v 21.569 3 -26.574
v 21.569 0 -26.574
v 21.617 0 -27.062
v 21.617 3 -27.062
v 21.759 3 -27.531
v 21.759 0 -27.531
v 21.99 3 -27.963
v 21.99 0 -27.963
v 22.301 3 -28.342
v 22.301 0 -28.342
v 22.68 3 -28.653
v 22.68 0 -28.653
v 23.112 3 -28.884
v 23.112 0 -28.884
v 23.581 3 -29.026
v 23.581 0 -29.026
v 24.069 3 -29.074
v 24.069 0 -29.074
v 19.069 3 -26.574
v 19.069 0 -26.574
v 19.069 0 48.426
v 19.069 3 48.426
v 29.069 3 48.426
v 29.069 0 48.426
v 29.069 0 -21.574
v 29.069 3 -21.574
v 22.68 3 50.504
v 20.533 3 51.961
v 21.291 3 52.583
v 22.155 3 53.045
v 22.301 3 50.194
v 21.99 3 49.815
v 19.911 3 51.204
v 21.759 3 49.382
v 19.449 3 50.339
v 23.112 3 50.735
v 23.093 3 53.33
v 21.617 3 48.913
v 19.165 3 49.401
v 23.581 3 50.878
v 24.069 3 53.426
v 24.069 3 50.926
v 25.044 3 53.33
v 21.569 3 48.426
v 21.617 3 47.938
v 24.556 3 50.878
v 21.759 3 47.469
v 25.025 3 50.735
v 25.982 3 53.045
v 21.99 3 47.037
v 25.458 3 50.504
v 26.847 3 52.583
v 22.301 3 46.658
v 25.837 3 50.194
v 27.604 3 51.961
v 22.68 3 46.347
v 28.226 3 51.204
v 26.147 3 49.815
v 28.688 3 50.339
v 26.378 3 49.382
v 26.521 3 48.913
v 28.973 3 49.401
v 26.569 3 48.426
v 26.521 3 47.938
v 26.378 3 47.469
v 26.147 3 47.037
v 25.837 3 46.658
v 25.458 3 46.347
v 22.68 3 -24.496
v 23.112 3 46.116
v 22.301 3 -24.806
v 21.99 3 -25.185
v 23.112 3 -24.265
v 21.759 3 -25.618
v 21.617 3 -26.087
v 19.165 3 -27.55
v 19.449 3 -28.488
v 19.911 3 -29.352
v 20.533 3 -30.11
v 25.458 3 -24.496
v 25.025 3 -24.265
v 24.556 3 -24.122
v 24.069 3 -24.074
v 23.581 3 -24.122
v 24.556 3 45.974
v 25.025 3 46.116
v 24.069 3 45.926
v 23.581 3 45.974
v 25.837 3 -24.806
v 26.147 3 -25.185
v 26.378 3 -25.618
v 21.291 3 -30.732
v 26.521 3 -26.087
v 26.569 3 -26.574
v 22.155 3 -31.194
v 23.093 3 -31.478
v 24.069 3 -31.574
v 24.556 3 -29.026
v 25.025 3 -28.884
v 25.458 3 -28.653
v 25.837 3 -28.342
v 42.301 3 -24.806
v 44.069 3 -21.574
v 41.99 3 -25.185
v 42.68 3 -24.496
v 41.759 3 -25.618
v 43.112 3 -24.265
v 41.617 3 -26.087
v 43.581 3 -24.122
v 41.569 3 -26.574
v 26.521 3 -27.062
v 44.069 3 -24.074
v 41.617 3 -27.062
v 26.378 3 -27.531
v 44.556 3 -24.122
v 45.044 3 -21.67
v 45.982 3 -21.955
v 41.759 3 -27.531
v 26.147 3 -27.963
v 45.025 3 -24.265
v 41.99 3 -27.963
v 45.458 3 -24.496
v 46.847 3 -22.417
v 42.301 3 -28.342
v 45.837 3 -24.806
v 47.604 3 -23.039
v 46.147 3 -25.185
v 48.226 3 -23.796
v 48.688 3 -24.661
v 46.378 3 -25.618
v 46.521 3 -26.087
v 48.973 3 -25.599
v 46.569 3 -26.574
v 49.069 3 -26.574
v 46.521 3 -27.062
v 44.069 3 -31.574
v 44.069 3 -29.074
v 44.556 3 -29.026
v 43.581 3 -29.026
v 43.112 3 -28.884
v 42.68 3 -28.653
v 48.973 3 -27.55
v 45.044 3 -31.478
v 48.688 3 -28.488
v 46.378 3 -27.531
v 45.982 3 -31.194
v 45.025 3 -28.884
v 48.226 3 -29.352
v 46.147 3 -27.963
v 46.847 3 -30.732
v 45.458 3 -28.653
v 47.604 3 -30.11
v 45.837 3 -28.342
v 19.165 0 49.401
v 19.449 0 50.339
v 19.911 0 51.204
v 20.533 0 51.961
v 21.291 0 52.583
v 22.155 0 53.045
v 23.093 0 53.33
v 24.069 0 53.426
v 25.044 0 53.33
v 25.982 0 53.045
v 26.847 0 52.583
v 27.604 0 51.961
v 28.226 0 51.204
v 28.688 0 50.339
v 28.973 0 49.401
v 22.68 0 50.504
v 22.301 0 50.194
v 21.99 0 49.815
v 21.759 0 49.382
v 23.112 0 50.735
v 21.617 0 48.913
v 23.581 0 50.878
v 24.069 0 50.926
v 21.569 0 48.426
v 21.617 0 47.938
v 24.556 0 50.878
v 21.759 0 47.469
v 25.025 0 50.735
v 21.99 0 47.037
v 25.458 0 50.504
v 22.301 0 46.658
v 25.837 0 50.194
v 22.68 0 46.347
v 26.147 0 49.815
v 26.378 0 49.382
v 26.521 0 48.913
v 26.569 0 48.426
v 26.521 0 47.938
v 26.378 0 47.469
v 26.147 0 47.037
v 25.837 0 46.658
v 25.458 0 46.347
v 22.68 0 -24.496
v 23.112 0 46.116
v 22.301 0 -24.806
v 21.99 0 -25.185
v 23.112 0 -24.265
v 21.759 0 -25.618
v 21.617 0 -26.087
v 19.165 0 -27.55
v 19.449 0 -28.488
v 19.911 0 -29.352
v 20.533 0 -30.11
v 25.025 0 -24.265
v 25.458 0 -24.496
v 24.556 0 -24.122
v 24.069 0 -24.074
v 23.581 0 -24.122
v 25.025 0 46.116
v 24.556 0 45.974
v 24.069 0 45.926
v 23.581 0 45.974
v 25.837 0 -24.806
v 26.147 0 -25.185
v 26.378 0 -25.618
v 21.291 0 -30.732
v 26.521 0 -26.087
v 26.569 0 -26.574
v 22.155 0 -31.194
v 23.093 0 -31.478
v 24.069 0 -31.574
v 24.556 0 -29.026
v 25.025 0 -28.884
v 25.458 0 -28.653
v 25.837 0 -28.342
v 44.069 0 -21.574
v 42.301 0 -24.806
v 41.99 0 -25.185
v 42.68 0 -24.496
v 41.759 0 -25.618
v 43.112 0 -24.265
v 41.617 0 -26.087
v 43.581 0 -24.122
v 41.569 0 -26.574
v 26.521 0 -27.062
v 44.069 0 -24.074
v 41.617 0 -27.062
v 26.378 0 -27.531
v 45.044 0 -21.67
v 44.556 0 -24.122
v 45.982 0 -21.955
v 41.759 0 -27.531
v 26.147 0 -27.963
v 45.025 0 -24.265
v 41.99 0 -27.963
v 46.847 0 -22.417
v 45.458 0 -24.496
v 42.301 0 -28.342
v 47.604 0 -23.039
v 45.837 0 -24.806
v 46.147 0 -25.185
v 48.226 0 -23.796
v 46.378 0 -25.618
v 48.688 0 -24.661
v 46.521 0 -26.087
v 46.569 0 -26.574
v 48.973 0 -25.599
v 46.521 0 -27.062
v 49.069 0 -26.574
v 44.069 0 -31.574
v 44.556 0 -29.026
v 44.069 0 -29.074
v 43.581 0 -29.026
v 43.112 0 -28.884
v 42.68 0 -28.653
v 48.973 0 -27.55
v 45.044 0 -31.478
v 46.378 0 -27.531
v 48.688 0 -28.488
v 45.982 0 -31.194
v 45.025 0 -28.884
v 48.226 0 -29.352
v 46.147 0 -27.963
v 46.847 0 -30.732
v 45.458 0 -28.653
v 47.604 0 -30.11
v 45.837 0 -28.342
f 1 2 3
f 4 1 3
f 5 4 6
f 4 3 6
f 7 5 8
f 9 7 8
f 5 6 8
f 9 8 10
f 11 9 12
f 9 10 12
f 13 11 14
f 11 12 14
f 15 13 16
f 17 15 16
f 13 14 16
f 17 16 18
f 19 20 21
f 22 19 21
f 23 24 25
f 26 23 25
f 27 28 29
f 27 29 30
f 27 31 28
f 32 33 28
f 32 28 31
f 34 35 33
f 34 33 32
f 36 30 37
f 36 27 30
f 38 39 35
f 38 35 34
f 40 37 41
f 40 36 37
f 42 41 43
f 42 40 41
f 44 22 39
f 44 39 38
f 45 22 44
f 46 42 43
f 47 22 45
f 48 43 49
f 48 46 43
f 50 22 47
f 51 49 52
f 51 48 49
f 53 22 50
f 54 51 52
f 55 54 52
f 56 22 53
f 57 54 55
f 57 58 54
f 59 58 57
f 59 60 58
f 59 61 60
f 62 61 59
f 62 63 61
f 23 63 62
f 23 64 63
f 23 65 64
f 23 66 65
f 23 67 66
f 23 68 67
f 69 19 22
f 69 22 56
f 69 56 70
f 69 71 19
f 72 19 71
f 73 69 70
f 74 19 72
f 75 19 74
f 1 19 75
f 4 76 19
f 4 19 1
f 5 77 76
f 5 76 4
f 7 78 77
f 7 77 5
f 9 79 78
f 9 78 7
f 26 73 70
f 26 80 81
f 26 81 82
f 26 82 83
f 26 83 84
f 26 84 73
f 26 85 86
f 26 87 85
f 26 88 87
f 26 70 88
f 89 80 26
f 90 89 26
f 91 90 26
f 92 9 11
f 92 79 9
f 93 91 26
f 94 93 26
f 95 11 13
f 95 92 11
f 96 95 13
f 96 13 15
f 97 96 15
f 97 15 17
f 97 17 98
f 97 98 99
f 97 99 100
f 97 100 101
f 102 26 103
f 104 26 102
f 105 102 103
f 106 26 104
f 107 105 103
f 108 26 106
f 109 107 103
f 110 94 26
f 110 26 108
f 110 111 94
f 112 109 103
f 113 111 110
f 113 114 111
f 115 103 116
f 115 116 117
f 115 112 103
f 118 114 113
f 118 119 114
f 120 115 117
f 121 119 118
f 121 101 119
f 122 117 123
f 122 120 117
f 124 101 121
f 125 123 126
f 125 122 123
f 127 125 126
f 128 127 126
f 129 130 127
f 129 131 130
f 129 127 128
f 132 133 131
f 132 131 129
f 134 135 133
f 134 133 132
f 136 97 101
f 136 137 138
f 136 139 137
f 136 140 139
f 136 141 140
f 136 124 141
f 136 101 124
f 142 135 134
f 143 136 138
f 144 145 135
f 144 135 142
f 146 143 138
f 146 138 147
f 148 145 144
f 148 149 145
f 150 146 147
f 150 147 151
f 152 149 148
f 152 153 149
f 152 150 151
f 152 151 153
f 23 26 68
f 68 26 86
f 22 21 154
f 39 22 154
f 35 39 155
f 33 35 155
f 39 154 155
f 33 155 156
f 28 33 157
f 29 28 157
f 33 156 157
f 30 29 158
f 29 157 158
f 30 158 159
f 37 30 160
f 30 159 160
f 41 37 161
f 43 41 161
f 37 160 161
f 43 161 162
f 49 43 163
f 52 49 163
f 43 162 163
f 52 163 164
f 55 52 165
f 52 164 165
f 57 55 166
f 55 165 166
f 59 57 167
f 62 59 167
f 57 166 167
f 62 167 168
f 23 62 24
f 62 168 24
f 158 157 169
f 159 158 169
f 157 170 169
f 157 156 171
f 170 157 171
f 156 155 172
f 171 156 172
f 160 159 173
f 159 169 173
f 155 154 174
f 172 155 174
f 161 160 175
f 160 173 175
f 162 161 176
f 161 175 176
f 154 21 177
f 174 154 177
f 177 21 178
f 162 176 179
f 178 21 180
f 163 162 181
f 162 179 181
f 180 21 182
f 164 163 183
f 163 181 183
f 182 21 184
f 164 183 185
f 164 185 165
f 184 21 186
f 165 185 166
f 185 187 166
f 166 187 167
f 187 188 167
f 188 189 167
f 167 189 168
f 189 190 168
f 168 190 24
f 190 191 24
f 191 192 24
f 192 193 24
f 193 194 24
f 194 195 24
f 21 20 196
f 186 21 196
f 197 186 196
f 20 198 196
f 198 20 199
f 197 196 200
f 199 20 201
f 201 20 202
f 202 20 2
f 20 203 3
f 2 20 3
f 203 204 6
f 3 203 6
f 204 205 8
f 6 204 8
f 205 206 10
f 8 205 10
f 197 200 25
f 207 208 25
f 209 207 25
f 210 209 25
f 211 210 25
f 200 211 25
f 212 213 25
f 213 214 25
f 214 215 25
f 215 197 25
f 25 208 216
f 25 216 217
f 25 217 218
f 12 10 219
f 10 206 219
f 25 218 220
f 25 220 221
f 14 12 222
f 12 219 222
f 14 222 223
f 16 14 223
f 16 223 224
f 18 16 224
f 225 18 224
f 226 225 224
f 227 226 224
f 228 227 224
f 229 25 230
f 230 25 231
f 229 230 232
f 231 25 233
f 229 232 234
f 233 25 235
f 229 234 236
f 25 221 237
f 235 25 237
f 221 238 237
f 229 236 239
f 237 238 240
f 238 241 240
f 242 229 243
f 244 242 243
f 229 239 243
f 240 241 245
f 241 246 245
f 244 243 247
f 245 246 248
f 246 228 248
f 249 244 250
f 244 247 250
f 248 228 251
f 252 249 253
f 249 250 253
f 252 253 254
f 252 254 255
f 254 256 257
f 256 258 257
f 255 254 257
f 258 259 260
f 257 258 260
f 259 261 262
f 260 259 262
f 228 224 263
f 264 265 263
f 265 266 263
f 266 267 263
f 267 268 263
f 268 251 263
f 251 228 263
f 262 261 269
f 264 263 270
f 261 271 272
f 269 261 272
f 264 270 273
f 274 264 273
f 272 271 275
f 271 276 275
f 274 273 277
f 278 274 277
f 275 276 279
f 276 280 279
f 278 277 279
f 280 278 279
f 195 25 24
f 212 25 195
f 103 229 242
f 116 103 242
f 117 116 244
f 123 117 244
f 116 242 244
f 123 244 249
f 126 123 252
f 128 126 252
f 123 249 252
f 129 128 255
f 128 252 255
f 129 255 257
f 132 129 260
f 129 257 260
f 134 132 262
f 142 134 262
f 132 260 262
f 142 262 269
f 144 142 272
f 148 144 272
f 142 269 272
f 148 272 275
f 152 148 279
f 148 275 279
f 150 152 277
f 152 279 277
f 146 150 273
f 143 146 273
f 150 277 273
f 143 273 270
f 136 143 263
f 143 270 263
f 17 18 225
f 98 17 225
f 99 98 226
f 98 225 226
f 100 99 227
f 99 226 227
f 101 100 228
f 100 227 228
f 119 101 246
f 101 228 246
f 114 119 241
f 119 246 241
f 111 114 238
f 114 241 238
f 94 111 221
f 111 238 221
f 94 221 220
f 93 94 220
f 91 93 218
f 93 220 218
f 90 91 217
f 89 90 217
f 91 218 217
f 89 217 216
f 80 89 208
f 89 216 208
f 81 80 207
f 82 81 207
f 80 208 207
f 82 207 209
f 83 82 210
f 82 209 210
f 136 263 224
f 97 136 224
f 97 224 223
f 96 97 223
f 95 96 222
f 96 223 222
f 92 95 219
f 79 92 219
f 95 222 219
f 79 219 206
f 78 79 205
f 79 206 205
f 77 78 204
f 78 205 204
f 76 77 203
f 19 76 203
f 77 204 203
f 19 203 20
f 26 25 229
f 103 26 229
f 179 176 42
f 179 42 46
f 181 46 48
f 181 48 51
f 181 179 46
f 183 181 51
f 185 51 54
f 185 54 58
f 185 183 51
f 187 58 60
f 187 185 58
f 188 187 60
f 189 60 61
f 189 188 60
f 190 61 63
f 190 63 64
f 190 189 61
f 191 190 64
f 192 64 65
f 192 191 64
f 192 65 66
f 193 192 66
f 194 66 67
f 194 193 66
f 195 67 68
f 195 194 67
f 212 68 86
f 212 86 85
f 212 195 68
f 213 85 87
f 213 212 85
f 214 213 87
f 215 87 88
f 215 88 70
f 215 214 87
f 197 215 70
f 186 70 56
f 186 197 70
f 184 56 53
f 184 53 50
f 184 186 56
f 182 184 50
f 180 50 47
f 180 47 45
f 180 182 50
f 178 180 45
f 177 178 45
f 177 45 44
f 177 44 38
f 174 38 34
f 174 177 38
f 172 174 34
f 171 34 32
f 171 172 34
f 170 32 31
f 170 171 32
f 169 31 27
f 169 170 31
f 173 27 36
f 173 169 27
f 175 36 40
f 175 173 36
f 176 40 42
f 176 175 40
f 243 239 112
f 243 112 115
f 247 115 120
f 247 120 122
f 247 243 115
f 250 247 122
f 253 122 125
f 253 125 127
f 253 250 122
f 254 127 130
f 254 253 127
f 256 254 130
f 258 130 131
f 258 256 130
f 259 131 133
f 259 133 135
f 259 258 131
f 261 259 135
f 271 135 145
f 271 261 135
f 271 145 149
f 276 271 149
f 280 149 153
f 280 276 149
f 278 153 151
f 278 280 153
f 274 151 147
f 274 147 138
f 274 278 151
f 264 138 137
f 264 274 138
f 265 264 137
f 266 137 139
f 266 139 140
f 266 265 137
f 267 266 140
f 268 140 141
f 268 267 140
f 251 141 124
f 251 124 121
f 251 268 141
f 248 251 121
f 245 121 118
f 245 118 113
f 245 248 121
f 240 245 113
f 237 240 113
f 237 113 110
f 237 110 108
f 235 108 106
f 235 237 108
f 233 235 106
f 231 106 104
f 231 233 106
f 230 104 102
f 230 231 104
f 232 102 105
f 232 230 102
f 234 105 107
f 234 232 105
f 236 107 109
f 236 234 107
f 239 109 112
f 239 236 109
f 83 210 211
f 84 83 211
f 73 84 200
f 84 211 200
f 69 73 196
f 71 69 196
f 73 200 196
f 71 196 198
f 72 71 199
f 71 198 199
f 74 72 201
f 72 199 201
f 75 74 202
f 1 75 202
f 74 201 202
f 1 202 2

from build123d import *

# Parameters (mm, degrees)
SKETCH1_R           = 2.5
BOSS_EXTRUDE1_DEPTH = 3


with BuildPart() as part:
    # Sketch1 → Boss-Extrude1 (new body)
    # profile 1 of 4: a face of its own
    with BuildSketch(Plane(origin=(0, 0, 0), x_dir=(1, 0, 0), z_dir=(0, 1, 0))):
        with BuildLine():
            Line((19.068769591, 26.574235382), (19.068769591, -48.425764618))
            ThreePointArc((19.068769591, -48.425764618), (24.068769591, -53.425764618), (29.068769591, -48.425764618))
            Line((29.068769591, -48.425764618), (29.068769591, 21.574235382))
            Line((29.068769591, 21.574235382), (24.068769591, 21.574235382))
            Line((24.068769591, 21.574235382), (24.068769591, 24.074235382))
            ThreePointArc((24.068769591, 24.074235382), (22.301002638, 24.806468429), (21.568769591, 26.574235382))
            Line((21.568769591, 26.574235382), (19.068769591, 26.574235382))
        make_face()
        with Locations(Location((24.068769591, -48.425764618, 0), (0, 0, 270))):
            Circle(SKETCH1_R, mode=Mode.SUBTRACT)
    # profile 2 of 4: a face of its own
    with BuildSketch(Plane(origin=(0, 0, 0), x_dir=(1, 0, 0), z_dir=(0, 1, 0))):
        with BuildLine():
            Line((44.068769591, 31.574235382), (24.068769591, 31.574235382))
            Line((24.068769591, 31.574235382), (24.068769591, 29.074235382))
            ThreePointArc((24.068769591, 29.074235382), (25.836536544, 28.342002335), (26.568769591, 26.574235382))
            Line((26.568769591, 26.574235382), (29.068769591, 26.574235382))
            Line((29.068769591, 26.574235382), (29.068769591, 21.574235382))
            Line((29.068769591, 21.574235382), (44.068769591, 21.574235382))
            ThreePointArc((44.068769591, 21.574235382), (49.068769591, 26.574235382), (44.068769591, 31.574235382))
        make_face()
        with Locations(Location((44.068769591, 26.574235382, 0), (0, 0, 270))):
            Circle(SKETCH1_R, mode=Mode.SUBTRACT)
    # profile 3 of 4: a face of its own
    with BuildSketch(Plane(origin=(0, 0, 0), x_dir=(1, 0, 0), z_dir=(0, 1, 0))):
        with BuildLine():
            Line((24.068769591, 21.574235382), (29.068769591, 21.574235382))
            Line((29.068769591, 21.574235382), (29.068769591, 26.574235382))
            Line((29.068769591, 26.574235382), (26.568769591, 26.574235382))
            ThreePointArc((26.568769591, 26.574235382), (25.836536544, 24.806468429), (24.068769591, 24.074235382))
            Line((24.068769591, 24.074235382), (24.068769591, 21.574235382))
        make_face()
    # profile 4 of 4: a face of its own
    with BuildSketch(Plane(origin=(0, 0, 0), x_dir=(1, 0, 0), z_dir=(0, 1, 0))):
        with BuildLine():
            ThreePointArc((24.068769591, 31.574235382), (20.533235685, 30.109769288), (19.068769591, 26.574235382))
            Line((19.068769591, 26.574235382), (21.568769591, 26.574235382))
            ThreePointArc((21.568769591, 26.574235382), (22.301002638, 28.342002335), (24.068769591, 29.074235382))
            Line((24.068769591, 29.074235382), (24.068769591, 31.574235382))
        make_face()
    extrude(amount=BOSS_EXTRUDE1_DEPTH)


solid = part.part
